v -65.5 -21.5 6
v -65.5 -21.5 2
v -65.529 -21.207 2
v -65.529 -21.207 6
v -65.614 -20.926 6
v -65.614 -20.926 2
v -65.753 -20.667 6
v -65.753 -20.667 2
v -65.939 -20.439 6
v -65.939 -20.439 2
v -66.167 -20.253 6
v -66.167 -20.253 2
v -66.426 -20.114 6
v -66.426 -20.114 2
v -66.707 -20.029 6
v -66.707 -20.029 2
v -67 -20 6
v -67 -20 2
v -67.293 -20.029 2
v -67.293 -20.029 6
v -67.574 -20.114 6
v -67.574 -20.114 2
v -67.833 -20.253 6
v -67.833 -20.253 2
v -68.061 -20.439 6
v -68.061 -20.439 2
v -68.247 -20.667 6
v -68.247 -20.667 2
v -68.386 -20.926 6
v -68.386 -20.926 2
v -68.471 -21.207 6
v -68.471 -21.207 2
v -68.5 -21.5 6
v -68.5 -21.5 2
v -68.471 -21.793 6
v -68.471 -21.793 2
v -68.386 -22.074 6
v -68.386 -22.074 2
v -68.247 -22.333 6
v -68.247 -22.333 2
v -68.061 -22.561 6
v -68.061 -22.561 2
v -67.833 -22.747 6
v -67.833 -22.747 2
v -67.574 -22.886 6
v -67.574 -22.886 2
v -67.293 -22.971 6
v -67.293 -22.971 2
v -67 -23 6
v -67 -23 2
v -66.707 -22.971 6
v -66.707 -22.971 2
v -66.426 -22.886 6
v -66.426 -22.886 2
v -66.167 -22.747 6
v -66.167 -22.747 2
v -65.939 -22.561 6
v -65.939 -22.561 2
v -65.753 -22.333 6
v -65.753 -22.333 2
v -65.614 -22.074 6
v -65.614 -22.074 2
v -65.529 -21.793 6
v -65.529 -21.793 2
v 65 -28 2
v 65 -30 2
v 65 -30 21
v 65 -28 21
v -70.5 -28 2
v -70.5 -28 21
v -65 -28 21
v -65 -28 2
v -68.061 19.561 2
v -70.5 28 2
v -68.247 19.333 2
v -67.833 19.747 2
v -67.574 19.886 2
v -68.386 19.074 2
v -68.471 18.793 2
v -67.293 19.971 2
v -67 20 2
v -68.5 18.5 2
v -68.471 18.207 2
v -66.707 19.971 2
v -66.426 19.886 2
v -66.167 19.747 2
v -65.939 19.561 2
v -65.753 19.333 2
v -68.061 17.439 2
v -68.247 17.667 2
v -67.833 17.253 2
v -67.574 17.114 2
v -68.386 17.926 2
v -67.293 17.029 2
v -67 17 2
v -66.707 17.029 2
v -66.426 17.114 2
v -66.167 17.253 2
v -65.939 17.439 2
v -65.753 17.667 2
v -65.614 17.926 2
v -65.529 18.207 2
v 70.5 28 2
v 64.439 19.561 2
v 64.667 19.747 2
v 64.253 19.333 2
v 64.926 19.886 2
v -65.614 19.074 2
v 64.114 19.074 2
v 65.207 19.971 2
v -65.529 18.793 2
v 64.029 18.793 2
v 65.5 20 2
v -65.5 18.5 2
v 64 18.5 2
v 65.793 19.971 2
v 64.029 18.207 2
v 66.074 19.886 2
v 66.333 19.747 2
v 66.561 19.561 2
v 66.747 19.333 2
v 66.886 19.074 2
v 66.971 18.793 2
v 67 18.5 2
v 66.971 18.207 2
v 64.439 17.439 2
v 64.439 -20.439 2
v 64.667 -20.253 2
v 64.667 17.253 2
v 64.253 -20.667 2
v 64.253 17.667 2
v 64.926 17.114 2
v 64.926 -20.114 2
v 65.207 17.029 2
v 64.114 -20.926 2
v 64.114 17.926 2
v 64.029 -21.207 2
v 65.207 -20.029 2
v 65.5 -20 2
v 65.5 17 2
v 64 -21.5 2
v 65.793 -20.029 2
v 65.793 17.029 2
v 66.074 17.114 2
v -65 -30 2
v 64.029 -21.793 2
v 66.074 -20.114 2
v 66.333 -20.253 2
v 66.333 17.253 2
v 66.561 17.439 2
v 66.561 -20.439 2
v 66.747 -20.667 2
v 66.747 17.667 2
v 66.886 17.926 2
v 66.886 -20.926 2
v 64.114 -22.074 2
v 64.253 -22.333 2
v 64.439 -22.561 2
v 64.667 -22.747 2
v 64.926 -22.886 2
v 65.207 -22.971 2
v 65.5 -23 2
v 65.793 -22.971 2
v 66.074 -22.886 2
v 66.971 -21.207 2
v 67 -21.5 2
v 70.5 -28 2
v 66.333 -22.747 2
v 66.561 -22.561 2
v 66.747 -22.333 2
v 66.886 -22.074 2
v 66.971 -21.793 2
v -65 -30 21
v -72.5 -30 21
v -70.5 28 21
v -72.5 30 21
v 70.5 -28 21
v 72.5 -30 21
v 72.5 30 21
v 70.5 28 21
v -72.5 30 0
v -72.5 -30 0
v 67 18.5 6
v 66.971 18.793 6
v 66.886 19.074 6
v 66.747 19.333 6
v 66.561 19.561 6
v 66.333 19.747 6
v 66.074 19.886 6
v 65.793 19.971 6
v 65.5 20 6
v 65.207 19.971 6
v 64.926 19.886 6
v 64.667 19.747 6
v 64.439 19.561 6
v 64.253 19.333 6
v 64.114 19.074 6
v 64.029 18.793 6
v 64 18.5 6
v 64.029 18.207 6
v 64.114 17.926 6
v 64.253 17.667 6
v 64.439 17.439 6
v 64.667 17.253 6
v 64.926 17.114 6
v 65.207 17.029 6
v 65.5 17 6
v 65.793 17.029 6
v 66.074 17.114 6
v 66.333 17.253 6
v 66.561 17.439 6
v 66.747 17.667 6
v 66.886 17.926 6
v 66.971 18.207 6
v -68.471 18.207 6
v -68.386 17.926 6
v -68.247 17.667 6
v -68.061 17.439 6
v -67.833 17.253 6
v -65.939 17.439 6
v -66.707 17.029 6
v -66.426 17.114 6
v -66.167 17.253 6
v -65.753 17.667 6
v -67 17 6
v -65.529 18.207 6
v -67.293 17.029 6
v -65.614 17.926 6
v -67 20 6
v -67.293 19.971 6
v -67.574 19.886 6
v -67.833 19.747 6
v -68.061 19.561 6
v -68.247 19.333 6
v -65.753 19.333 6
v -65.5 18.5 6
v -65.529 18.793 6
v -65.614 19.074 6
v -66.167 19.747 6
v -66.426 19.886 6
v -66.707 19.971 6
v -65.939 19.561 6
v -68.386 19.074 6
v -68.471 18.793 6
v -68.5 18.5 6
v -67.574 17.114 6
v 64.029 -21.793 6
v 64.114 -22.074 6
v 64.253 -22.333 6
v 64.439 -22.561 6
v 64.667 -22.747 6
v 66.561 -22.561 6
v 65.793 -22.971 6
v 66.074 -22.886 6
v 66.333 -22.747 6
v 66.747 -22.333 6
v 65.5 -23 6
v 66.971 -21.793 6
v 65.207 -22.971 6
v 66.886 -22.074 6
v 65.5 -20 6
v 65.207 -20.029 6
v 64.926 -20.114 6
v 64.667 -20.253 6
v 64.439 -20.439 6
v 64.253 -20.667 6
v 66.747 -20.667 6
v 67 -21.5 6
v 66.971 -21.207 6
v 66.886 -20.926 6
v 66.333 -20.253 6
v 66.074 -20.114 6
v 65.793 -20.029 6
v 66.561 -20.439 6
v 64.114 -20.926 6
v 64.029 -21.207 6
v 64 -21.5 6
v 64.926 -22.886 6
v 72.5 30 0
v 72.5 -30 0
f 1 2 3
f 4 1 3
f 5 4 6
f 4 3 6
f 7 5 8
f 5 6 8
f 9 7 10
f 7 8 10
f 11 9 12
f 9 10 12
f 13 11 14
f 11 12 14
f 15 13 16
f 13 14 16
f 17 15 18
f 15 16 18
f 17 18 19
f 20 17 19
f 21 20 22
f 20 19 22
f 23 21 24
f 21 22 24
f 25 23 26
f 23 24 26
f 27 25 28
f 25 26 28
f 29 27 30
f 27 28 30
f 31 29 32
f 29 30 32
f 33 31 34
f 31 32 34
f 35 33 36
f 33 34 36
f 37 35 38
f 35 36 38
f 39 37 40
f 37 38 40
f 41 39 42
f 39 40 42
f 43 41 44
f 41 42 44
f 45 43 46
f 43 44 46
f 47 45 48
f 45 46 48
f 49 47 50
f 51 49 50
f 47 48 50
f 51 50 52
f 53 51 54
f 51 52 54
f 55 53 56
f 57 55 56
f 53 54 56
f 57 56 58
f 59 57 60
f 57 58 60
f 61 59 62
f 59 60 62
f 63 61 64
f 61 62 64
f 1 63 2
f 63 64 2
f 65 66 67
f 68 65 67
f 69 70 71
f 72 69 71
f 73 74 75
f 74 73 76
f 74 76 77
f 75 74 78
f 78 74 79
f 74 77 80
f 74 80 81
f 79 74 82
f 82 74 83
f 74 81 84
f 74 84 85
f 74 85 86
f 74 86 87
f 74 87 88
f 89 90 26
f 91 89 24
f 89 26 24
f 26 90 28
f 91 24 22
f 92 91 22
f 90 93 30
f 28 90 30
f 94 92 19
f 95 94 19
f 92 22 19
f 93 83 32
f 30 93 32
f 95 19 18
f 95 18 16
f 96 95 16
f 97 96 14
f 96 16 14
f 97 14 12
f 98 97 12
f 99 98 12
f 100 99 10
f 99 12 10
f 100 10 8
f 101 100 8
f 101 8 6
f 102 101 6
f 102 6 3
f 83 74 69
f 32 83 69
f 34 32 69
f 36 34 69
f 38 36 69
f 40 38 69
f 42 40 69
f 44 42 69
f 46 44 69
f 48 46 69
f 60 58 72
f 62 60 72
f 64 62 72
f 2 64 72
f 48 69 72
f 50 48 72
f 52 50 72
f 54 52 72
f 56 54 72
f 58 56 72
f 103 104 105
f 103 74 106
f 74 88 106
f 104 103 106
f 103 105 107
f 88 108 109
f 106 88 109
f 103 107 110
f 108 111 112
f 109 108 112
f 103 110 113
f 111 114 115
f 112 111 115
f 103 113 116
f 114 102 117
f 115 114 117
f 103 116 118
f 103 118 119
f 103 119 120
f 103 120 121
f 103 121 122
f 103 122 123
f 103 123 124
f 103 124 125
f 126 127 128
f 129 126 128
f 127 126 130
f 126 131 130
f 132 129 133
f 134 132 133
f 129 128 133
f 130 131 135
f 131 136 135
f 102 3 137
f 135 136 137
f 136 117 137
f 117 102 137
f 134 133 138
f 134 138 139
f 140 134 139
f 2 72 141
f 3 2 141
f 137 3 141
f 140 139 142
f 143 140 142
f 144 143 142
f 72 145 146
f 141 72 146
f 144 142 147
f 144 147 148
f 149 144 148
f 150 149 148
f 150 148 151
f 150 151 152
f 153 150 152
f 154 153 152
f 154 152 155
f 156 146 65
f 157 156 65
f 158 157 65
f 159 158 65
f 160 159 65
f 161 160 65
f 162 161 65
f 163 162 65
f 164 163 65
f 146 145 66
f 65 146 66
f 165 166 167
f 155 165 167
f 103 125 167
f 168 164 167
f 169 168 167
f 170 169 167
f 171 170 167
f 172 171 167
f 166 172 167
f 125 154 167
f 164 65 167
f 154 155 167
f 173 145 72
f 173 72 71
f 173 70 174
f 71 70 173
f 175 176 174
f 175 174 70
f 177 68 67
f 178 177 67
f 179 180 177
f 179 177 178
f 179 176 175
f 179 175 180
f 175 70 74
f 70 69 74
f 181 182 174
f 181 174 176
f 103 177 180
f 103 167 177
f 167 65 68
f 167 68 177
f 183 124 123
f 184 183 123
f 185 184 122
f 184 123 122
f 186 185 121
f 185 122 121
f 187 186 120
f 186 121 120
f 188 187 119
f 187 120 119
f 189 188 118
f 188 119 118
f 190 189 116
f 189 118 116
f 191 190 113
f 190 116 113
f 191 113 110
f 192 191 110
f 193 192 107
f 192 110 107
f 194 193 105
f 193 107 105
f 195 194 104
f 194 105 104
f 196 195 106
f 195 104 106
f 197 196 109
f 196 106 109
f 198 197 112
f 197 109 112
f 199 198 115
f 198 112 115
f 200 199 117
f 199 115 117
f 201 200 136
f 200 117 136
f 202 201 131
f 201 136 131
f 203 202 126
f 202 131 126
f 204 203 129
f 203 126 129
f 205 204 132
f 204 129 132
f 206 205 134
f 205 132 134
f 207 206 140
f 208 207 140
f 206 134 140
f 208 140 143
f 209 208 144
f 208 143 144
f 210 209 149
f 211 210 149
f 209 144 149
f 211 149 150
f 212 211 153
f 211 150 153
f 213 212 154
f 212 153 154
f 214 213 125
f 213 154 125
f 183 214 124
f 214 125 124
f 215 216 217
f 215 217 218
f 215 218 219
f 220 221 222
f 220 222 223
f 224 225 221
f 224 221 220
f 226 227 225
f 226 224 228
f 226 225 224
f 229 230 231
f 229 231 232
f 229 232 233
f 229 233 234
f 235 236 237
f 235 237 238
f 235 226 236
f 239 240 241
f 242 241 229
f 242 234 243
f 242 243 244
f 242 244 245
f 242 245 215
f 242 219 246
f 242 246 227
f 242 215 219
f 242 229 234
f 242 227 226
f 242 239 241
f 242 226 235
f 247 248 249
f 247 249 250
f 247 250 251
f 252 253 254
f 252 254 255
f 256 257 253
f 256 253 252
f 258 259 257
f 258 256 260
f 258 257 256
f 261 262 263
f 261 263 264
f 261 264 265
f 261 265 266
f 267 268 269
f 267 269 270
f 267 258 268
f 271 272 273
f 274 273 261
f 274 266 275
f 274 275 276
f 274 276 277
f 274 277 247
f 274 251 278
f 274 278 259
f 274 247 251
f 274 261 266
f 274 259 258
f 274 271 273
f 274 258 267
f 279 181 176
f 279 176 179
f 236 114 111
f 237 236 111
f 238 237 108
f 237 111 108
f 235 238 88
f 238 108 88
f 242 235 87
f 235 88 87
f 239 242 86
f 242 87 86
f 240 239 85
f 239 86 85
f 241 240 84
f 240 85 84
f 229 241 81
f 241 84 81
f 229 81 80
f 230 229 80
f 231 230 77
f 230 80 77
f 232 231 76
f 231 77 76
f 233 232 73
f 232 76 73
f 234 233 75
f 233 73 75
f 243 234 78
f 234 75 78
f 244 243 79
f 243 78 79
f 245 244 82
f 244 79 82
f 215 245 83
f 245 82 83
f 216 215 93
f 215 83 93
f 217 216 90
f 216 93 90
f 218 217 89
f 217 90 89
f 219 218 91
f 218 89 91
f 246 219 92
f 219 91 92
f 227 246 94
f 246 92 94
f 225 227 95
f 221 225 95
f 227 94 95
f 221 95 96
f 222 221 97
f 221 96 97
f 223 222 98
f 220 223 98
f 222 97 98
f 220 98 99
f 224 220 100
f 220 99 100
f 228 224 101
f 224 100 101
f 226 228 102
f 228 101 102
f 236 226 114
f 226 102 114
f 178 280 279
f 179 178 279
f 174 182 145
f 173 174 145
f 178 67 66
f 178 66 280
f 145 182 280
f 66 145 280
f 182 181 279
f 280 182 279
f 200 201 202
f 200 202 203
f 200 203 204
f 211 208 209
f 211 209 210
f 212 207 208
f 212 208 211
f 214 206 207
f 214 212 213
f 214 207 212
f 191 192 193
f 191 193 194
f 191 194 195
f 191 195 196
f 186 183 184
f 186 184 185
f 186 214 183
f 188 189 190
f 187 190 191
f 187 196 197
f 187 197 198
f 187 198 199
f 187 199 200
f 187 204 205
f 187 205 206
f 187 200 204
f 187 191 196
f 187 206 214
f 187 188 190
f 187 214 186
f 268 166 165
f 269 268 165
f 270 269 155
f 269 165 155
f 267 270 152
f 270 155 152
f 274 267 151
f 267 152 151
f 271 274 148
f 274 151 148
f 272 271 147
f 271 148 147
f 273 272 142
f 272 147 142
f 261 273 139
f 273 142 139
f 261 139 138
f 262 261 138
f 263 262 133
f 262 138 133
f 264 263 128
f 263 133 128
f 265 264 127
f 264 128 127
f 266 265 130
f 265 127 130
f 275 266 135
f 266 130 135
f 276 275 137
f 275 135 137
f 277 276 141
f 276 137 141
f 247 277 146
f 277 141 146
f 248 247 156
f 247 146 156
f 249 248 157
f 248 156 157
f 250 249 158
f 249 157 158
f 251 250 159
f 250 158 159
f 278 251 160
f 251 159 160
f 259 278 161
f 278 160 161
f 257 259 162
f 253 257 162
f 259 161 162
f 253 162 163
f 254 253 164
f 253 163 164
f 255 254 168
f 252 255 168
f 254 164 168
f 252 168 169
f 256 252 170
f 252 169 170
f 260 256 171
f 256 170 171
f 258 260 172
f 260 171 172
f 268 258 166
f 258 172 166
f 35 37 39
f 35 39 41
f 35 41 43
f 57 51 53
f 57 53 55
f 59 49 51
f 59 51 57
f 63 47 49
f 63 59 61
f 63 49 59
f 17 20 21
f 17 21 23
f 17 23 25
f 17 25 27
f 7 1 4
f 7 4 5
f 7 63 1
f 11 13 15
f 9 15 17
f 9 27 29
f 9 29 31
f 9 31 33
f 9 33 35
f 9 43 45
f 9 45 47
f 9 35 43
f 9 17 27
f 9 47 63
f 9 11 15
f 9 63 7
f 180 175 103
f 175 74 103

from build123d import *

# Parameters (mm, degrees)
SKETCH_W     = 145
SKETCH_H     = 60
PAD_DEPTH    = 21
THICKNESS_T  = -2
SKETCH001_W  = 130
SKETCH001_H  = 19
POCKET_DEPTH = 2
SKETCH002_R  = 1.5
PAD001_DEPTH = 4


with BuildPart() as part:
    # Sketch → Pad (new body)
    with BuildSketch(Plane.XY):
        Rectangle(SKETCH_W, SKETCH_H)
    extrude(amount=PAD_DEPTH)

    # Thickness
    thickness_openings = [part.faces().sort_by_distance(p)[0] for p in [
        (0, 0, 21),
    ]]
    offset(amount=THICKNESS_T, openings=thickness_openings)

    # Sketch001 (on Face3 of Thickness) → Pocket (cut)
    with BuildSketch(Plane.XZ.offset(30)):
        with Locations((0, 11.5)):
            Rectangle(SKETCH001_W, SKETCH001_H)
    extrude(amount=-POCKET_DEPTH, mode=Mode.SUBTRACT)

    # Sketch002 (on Face15 of Pocket) → Pad001 (join)
    with BuildSketch(Plane.XY.offset(2)):
        with Locations((-67, 18.5)):
            Circle(SKETCH002_R)
        with Locations((-67, -21.5)):
            Circle(SKETCH002_R)
        with Locations((65.5, 18.5)):
            Circle(SKETCH002_R)
        with Locations((65.5, -21.5)):
            Circle(SKETCH002_R)
    extrude(amount=PAD001_DEPTH)


solid = part.part
